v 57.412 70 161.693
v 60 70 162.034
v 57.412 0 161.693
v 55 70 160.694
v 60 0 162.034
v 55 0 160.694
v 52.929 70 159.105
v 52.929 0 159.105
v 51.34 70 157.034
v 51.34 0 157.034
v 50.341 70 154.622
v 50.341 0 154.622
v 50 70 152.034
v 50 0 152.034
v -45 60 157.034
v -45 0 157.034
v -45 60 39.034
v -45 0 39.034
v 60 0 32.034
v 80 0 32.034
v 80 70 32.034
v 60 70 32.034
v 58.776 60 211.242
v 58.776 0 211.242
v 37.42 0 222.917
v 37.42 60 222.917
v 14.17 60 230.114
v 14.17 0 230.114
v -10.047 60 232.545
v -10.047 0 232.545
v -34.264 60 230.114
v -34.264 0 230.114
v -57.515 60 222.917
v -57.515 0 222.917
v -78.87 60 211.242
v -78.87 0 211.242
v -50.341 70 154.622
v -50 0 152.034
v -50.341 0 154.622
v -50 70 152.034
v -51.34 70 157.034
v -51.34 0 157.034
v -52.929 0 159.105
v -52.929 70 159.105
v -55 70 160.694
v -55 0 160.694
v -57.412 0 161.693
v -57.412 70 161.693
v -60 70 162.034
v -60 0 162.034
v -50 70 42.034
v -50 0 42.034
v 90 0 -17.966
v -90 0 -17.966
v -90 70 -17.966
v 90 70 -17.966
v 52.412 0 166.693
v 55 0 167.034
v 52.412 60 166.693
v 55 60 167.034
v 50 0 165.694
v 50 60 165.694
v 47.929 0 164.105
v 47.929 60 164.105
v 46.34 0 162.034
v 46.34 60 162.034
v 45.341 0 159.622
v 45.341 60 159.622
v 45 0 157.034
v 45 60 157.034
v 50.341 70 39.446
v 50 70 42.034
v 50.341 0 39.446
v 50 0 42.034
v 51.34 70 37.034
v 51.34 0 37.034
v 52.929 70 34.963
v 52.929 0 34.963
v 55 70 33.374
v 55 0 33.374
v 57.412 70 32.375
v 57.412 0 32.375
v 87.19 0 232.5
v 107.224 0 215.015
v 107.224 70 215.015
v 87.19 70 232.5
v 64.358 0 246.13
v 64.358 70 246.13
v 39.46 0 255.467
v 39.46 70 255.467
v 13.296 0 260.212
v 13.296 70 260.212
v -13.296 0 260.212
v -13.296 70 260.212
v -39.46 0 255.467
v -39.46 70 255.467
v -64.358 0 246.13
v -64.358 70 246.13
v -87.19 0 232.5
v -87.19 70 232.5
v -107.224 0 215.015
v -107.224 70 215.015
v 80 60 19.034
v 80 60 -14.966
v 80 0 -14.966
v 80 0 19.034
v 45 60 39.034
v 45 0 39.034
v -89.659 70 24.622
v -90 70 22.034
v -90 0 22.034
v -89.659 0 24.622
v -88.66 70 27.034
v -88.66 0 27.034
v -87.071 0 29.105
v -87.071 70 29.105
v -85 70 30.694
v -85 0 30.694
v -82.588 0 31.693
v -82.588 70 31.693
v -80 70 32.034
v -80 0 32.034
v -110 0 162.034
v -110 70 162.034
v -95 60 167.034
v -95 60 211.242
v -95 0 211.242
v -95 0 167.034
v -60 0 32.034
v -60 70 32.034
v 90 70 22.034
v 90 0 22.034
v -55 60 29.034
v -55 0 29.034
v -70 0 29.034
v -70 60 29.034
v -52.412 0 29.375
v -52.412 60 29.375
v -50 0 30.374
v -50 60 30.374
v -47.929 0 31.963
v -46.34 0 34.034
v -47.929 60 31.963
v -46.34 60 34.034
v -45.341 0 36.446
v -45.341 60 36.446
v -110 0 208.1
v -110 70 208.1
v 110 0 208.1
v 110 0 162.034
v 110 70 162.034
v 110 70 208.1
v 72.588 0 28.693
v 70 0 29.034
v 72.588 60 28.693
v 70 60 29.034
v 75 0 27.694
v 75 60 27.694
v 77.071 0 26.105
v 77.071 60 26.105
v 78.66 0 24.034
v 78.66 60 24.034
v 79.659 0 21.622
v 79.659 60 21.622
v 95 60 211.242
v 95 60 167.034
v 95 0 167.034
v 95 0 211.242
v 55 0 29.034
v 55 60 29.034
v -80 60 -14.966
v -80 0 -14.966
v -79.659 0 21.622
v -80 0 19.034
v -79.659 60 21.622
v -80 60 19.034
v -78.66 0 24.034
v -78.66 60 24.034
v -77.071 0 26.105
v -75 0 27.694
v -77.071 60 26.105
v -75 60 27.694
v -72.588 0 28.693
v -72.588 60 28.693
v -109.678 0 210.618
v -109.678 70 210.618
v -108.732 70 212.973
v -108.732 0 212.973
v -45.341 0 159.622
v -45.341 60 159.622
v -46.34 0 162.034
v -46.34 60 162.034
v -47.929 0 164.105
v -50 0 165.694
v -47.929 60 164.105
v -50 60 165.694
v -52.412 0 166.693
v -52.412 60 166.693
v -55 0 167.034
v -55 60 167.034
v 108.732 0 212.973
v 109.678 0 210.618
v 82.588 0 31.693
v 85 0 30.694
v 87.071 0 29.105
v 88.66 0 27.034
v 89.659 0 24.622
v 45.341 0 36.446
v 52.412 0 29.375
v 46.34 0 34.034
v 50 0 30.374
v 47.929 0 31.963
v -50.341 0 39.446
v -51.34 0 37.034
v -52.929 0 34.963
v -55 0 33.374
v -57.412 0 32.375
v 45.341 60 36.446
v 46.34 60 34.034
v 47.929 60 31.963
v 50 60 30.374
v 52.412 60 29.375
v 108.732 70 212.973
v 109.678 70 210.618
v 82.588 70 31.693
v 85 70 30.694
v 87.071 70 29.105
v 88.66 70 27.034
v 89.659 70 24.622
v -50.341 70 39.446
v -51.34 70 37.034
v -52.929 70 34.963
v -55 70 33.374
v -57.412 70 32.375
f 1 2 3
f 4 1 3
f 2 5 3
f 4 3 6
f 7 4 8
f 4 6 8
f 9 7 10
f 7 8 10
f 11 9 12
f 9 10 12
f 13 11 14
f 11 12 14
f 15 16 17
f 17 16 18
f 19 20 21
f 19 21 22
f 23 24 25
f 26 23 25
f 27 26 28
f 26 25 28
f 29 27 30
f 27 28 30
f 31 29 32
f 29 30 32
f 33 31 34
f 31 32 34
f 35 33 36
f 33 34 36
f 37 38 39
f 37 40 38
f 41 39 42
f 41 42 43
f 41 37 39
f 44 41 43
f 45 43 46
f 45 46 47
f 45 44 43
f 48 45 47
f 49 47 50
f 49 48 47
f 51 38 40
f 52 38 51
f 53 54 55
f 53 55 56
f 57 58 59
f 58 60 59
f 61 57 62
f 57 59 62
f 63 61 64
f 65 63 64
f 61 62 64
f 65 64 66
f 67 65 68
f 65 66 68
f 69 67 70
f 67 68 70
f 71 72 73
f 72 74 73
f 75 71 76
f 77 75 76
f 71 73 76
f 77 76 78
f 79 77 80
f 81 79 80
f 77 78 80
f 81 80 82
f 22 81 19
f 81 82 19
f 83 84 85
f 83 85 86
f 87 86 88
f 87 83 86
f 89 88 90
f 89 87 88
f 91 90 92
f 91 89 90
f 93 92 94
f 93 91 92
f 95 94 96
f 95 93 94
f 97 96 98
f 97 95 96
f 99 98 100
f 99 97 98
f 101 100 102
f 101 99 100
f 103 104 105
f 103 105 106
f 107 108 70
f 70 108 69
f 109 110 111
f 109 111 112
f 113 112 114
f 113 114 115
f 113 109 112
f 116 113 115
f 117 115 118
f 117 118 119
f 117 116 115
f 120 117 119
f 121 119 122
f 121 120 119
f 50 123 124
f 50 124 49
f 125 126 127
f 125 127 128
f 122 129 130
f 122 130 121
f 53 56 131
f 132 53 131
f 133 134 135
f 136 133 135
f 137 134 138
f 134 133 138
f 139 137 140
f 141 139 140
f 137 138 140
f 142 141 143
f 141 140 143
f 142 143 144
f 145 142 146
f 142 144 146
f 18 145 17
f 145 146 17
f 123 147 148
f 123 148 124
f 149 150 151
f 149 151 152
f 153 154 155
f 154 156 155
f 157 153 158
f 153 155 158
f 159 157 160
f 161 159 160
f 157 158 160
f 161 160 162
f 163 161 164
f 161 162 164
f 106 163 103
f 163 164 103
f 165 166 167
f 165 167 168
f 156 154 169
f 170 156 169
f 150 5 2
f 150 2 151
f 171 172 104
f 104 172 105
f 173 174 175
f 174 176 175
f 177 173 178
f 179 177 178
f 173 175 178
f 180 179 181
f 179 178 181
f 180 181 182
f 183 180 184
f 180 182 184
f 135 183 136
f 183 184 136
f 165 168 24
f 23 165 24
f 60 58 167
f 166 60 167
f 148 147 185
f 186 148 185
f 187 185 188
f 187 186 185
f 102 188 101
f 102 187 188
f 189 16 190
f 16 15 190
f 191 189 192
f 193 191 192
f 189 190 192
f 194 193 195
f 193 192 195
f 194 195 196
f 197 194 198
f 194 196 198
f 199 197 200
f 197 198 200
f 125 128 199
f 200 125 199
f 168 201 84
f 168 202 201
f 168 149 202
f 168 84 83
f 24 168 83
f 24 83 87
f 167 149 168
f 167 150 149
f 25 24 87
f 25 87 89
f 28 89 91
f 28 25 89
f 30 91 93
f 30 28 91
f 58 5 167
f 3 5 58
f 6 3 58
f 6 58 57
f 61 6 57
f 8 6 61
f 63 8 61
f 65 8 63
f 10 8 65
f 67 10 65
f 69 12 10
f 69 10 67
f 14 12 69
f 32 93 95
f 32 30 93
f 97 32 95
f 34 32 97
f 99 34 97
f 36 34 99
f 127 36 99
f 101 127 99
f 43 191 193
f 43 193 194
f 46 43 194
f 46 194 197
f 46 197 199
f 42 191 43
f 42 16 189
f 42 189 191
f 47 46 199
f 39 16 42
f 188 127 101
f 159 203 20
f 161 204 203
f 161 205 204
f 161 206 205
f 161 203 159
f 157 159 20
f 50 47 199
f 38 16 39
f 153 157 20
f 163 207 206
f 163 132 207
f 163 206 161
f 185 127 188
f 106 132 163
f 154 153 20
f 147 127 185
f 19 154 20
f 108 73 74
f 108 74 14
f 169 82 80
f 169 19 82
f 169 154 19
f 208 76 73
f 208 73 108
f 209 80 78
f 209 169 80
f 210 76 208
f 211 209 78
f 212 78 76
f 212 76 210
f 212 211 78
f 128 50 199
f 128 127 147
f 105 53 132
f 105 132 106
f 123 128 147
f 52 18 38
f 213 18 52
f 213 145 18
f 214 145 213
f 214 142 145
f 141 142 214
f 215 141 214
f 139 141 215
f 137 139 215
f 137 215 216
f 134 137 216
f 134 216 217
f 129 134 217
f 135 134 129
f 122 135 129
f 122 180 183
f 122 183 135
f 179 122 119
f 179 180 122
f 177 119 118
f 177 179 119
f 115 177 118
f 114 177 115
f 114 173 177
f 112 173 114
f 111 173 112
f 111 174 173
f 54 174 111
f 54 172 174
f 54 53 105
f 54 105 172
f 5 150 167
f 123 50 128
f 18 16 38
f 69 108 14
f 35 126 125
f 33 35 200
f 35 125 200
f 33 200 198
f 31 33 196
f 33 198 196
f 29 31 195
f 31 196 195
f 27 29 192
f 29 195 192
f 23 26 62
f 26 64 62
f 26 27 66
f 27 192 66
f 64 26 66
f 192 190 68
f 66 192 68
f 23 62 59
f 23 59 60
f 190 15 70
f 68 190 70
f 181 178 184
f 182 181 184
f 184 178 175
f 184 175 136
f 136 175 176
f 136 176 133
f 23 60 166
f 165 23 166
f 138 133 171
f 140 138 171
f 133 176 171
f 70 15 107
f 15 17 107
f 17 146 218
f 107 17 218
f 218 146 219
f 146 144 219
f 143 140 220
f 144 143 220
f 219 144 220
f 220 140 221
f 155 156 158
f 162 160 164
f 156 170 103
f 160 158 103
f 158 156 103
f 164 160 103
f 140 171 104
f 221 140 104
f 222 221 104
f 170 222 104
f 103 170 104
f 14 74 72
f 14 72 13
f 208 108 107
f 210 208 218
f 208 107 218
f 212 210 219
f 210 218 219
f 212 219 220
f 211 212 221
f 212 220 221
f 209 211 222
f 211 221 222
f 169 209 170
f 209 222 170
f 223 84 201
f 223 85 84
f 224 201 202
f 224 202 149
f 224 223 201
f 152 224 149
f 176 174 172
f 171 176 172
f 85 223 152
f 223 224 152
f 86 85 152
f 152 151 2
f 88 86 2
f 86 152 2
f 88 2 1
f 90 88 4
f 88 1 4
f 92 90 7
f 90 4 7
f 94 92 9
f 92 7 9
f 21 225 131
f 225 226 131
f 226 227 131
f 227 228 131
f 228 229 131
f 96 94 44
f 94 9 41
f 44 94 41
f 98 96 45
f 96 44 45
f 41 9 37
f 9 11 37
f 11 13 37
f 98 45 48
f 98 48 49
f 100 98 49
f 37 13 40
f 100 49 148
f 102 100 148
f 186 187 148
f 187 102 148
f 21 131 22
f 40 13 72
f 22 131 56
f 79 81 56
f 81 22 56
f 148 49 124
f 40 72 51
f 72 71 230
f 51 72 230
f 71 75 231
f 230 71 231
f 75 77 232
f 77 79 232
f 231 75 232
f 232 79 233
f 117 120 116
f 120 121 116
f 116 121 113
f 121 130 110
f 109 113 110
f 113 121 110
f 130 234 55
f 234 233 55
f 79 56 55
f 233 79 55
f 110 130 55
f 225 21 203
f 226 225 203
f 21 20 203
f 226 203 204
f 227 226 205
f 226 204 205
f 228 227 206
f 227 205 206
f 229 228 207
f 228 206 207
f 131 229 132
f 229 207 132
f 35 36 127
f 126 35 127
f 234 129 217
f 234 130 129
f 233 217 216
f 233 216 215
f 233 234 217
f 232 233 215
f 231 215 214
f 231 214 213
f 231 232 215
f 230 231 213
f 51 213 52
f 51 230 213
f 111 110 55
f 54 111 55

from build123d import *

# Parameters (mm, degrees)
BOSS_EXTRUDE1_DEPTH = 70
FILLET3_R           = 10
BOSS_EXTRUDE2_DEPTH = 10
FILLET4_R           = 10


with BuildPart() as part:
    # Sketch1 → Boss-Extrude1 (new body)
    with BuildSketch(Plane(origin=(0, 0, 0), x_dir=(1, 0, 0), z_dir=(0, 1, 0))):
        with BuildLine():
            Line((-90, 17.965988739), (90, 17.965988739))
            Line((90, 17.965988739), (90, -32.034011261))
            Line((90, -32.034011261), (50, -32.034011261))
            Line((50, -32.034011261), (50, -162.034011261))
            Line((50, -162.034011261), (110, -162.034011261))
            Line((110, -162.034011261), (110, -212.034011261))
            ThreePointArc((110, -212.034011261), (0, -260.808853853), (-110, -212.034011261))
            Line((-110, -212.034011261), (-110, -162.034011261))
            Line((-110, -162.034011261), (-50, -162.034011261))
            Line((-50, -162.034011261), (-50, -32.034011261))
            Line((-50, -32.034011261), (-90, -32.034011261))
            Line((-90, -32.034011261), (-90, 17.965988739))
        make_face()
        with BuildLine():
            Line((-80, 14.965988739), (80, 14.965988739))
            Line((80, 14.965988739), (80, -29.034011261))
            Line((80, -29.034011261), (45, -29.034011261))
            Line((45, -29.034011261), (45, -167.034011261))
            Line((45, -167.034011261), (95, -167.034011261))
            Line((95, -167.034011261), (95, -211.241666668))
            Line((95, -211.241666668), (58.77564579, -211.241666668))
            ThreePointArc((58.77564579, -211.241666668), (-10.047427033, -232.545270894), (-78.870499857, -211.241666668))
            Line((-78.870499857, -211.241666668), (-95, -211.241666668))
            Line((-95, -211.241666668), (-95, -167.034011261))
            Line((-95, -167.034011261), (-45, -167.034011261))
            Line((-45, -167.034011261), (-45, -29.034011261))
            Line((-45, -29.034011261), (-80, -29.034011261))
            Line((-80, -29.034011261), (-80, 14.965988739))
        make_face(mode=Mode.SUBTRACT)
    extrude(amount=BOSS_EXTRUDE1_DEPTH)

    # Fillet3
    fillet3_edges = [part.edges().sort_by_distance(p)[0] for p in [
        (-90, 35, 32.034011261),
    ]]
    fillet(fillet3_edges, radius=FILLET3_R)

    # Sketch9 → Boss-Extrude2 (add)
    with BuildSketch(Plane(origin=(0, 70, 0), x_dir=(1, 0, 0), z_dir=(0, 1, 0))):
        with BuildLine():
            Line((-90, 17.965988739), (-90, -22.034011261))
            ThreePointArc((-90, -22.034011261), (-87.071067812, -29.105079073), (-80, -32.034011261))
            Line((-80, -32.034011261), (-50, -32.034011261))
            Line((-50, -32.034011261), (-50, -162.034011261))
            Line((-50, -162.034011261), (-110, -162.034011261))
            Line((-110, -162.034011261), (-110, -212.034011261))
            ThreePointArc((-110, -212.034011261), (0, -260.808853853), (110, -212.034011261))
            Line((110, -212.034011261), (110, -162.034011261))
            Line((110, -162.034011261), (50, -162.034011261))
            Line((50, -162.034011261), (50, -32.034011261))
            Line((50, -32.034011261), (90, -32.034011261))
            Line((90, -32.034011261), (90, 17.965988739))
            Line((90, 17.965988739), (-90, 17.965988739))
        make_face()
    extrude(amount=-BOSS_EXTRUDE2_DEPTH)

    # Fillet4
    fillet4_edges = [part.edges().sort_by_distance(p)[0] for p in [
        (-45, 30, 167.034011261),
        (-45, 30, 29.034011261),
        (-80, 30, 29.034011261),
        (90, 35, 32.034011261),
        (50, 35, 32.034011261),
        (50, 35, 162.034011261),
        (110, 35, 212.034011261),
        (-110, 35, 212.034011261),
        (-50, 35, 162.034011261),
        (-50, 35, 32.034011261),
        (80, 30, 29.034011261),
        (45, 30, 29.034011261),
        (45, 30, 167.034011261),
    ]]
    fillet(fillet4_edges, radius=FILLET4_R)


solid = part.part
